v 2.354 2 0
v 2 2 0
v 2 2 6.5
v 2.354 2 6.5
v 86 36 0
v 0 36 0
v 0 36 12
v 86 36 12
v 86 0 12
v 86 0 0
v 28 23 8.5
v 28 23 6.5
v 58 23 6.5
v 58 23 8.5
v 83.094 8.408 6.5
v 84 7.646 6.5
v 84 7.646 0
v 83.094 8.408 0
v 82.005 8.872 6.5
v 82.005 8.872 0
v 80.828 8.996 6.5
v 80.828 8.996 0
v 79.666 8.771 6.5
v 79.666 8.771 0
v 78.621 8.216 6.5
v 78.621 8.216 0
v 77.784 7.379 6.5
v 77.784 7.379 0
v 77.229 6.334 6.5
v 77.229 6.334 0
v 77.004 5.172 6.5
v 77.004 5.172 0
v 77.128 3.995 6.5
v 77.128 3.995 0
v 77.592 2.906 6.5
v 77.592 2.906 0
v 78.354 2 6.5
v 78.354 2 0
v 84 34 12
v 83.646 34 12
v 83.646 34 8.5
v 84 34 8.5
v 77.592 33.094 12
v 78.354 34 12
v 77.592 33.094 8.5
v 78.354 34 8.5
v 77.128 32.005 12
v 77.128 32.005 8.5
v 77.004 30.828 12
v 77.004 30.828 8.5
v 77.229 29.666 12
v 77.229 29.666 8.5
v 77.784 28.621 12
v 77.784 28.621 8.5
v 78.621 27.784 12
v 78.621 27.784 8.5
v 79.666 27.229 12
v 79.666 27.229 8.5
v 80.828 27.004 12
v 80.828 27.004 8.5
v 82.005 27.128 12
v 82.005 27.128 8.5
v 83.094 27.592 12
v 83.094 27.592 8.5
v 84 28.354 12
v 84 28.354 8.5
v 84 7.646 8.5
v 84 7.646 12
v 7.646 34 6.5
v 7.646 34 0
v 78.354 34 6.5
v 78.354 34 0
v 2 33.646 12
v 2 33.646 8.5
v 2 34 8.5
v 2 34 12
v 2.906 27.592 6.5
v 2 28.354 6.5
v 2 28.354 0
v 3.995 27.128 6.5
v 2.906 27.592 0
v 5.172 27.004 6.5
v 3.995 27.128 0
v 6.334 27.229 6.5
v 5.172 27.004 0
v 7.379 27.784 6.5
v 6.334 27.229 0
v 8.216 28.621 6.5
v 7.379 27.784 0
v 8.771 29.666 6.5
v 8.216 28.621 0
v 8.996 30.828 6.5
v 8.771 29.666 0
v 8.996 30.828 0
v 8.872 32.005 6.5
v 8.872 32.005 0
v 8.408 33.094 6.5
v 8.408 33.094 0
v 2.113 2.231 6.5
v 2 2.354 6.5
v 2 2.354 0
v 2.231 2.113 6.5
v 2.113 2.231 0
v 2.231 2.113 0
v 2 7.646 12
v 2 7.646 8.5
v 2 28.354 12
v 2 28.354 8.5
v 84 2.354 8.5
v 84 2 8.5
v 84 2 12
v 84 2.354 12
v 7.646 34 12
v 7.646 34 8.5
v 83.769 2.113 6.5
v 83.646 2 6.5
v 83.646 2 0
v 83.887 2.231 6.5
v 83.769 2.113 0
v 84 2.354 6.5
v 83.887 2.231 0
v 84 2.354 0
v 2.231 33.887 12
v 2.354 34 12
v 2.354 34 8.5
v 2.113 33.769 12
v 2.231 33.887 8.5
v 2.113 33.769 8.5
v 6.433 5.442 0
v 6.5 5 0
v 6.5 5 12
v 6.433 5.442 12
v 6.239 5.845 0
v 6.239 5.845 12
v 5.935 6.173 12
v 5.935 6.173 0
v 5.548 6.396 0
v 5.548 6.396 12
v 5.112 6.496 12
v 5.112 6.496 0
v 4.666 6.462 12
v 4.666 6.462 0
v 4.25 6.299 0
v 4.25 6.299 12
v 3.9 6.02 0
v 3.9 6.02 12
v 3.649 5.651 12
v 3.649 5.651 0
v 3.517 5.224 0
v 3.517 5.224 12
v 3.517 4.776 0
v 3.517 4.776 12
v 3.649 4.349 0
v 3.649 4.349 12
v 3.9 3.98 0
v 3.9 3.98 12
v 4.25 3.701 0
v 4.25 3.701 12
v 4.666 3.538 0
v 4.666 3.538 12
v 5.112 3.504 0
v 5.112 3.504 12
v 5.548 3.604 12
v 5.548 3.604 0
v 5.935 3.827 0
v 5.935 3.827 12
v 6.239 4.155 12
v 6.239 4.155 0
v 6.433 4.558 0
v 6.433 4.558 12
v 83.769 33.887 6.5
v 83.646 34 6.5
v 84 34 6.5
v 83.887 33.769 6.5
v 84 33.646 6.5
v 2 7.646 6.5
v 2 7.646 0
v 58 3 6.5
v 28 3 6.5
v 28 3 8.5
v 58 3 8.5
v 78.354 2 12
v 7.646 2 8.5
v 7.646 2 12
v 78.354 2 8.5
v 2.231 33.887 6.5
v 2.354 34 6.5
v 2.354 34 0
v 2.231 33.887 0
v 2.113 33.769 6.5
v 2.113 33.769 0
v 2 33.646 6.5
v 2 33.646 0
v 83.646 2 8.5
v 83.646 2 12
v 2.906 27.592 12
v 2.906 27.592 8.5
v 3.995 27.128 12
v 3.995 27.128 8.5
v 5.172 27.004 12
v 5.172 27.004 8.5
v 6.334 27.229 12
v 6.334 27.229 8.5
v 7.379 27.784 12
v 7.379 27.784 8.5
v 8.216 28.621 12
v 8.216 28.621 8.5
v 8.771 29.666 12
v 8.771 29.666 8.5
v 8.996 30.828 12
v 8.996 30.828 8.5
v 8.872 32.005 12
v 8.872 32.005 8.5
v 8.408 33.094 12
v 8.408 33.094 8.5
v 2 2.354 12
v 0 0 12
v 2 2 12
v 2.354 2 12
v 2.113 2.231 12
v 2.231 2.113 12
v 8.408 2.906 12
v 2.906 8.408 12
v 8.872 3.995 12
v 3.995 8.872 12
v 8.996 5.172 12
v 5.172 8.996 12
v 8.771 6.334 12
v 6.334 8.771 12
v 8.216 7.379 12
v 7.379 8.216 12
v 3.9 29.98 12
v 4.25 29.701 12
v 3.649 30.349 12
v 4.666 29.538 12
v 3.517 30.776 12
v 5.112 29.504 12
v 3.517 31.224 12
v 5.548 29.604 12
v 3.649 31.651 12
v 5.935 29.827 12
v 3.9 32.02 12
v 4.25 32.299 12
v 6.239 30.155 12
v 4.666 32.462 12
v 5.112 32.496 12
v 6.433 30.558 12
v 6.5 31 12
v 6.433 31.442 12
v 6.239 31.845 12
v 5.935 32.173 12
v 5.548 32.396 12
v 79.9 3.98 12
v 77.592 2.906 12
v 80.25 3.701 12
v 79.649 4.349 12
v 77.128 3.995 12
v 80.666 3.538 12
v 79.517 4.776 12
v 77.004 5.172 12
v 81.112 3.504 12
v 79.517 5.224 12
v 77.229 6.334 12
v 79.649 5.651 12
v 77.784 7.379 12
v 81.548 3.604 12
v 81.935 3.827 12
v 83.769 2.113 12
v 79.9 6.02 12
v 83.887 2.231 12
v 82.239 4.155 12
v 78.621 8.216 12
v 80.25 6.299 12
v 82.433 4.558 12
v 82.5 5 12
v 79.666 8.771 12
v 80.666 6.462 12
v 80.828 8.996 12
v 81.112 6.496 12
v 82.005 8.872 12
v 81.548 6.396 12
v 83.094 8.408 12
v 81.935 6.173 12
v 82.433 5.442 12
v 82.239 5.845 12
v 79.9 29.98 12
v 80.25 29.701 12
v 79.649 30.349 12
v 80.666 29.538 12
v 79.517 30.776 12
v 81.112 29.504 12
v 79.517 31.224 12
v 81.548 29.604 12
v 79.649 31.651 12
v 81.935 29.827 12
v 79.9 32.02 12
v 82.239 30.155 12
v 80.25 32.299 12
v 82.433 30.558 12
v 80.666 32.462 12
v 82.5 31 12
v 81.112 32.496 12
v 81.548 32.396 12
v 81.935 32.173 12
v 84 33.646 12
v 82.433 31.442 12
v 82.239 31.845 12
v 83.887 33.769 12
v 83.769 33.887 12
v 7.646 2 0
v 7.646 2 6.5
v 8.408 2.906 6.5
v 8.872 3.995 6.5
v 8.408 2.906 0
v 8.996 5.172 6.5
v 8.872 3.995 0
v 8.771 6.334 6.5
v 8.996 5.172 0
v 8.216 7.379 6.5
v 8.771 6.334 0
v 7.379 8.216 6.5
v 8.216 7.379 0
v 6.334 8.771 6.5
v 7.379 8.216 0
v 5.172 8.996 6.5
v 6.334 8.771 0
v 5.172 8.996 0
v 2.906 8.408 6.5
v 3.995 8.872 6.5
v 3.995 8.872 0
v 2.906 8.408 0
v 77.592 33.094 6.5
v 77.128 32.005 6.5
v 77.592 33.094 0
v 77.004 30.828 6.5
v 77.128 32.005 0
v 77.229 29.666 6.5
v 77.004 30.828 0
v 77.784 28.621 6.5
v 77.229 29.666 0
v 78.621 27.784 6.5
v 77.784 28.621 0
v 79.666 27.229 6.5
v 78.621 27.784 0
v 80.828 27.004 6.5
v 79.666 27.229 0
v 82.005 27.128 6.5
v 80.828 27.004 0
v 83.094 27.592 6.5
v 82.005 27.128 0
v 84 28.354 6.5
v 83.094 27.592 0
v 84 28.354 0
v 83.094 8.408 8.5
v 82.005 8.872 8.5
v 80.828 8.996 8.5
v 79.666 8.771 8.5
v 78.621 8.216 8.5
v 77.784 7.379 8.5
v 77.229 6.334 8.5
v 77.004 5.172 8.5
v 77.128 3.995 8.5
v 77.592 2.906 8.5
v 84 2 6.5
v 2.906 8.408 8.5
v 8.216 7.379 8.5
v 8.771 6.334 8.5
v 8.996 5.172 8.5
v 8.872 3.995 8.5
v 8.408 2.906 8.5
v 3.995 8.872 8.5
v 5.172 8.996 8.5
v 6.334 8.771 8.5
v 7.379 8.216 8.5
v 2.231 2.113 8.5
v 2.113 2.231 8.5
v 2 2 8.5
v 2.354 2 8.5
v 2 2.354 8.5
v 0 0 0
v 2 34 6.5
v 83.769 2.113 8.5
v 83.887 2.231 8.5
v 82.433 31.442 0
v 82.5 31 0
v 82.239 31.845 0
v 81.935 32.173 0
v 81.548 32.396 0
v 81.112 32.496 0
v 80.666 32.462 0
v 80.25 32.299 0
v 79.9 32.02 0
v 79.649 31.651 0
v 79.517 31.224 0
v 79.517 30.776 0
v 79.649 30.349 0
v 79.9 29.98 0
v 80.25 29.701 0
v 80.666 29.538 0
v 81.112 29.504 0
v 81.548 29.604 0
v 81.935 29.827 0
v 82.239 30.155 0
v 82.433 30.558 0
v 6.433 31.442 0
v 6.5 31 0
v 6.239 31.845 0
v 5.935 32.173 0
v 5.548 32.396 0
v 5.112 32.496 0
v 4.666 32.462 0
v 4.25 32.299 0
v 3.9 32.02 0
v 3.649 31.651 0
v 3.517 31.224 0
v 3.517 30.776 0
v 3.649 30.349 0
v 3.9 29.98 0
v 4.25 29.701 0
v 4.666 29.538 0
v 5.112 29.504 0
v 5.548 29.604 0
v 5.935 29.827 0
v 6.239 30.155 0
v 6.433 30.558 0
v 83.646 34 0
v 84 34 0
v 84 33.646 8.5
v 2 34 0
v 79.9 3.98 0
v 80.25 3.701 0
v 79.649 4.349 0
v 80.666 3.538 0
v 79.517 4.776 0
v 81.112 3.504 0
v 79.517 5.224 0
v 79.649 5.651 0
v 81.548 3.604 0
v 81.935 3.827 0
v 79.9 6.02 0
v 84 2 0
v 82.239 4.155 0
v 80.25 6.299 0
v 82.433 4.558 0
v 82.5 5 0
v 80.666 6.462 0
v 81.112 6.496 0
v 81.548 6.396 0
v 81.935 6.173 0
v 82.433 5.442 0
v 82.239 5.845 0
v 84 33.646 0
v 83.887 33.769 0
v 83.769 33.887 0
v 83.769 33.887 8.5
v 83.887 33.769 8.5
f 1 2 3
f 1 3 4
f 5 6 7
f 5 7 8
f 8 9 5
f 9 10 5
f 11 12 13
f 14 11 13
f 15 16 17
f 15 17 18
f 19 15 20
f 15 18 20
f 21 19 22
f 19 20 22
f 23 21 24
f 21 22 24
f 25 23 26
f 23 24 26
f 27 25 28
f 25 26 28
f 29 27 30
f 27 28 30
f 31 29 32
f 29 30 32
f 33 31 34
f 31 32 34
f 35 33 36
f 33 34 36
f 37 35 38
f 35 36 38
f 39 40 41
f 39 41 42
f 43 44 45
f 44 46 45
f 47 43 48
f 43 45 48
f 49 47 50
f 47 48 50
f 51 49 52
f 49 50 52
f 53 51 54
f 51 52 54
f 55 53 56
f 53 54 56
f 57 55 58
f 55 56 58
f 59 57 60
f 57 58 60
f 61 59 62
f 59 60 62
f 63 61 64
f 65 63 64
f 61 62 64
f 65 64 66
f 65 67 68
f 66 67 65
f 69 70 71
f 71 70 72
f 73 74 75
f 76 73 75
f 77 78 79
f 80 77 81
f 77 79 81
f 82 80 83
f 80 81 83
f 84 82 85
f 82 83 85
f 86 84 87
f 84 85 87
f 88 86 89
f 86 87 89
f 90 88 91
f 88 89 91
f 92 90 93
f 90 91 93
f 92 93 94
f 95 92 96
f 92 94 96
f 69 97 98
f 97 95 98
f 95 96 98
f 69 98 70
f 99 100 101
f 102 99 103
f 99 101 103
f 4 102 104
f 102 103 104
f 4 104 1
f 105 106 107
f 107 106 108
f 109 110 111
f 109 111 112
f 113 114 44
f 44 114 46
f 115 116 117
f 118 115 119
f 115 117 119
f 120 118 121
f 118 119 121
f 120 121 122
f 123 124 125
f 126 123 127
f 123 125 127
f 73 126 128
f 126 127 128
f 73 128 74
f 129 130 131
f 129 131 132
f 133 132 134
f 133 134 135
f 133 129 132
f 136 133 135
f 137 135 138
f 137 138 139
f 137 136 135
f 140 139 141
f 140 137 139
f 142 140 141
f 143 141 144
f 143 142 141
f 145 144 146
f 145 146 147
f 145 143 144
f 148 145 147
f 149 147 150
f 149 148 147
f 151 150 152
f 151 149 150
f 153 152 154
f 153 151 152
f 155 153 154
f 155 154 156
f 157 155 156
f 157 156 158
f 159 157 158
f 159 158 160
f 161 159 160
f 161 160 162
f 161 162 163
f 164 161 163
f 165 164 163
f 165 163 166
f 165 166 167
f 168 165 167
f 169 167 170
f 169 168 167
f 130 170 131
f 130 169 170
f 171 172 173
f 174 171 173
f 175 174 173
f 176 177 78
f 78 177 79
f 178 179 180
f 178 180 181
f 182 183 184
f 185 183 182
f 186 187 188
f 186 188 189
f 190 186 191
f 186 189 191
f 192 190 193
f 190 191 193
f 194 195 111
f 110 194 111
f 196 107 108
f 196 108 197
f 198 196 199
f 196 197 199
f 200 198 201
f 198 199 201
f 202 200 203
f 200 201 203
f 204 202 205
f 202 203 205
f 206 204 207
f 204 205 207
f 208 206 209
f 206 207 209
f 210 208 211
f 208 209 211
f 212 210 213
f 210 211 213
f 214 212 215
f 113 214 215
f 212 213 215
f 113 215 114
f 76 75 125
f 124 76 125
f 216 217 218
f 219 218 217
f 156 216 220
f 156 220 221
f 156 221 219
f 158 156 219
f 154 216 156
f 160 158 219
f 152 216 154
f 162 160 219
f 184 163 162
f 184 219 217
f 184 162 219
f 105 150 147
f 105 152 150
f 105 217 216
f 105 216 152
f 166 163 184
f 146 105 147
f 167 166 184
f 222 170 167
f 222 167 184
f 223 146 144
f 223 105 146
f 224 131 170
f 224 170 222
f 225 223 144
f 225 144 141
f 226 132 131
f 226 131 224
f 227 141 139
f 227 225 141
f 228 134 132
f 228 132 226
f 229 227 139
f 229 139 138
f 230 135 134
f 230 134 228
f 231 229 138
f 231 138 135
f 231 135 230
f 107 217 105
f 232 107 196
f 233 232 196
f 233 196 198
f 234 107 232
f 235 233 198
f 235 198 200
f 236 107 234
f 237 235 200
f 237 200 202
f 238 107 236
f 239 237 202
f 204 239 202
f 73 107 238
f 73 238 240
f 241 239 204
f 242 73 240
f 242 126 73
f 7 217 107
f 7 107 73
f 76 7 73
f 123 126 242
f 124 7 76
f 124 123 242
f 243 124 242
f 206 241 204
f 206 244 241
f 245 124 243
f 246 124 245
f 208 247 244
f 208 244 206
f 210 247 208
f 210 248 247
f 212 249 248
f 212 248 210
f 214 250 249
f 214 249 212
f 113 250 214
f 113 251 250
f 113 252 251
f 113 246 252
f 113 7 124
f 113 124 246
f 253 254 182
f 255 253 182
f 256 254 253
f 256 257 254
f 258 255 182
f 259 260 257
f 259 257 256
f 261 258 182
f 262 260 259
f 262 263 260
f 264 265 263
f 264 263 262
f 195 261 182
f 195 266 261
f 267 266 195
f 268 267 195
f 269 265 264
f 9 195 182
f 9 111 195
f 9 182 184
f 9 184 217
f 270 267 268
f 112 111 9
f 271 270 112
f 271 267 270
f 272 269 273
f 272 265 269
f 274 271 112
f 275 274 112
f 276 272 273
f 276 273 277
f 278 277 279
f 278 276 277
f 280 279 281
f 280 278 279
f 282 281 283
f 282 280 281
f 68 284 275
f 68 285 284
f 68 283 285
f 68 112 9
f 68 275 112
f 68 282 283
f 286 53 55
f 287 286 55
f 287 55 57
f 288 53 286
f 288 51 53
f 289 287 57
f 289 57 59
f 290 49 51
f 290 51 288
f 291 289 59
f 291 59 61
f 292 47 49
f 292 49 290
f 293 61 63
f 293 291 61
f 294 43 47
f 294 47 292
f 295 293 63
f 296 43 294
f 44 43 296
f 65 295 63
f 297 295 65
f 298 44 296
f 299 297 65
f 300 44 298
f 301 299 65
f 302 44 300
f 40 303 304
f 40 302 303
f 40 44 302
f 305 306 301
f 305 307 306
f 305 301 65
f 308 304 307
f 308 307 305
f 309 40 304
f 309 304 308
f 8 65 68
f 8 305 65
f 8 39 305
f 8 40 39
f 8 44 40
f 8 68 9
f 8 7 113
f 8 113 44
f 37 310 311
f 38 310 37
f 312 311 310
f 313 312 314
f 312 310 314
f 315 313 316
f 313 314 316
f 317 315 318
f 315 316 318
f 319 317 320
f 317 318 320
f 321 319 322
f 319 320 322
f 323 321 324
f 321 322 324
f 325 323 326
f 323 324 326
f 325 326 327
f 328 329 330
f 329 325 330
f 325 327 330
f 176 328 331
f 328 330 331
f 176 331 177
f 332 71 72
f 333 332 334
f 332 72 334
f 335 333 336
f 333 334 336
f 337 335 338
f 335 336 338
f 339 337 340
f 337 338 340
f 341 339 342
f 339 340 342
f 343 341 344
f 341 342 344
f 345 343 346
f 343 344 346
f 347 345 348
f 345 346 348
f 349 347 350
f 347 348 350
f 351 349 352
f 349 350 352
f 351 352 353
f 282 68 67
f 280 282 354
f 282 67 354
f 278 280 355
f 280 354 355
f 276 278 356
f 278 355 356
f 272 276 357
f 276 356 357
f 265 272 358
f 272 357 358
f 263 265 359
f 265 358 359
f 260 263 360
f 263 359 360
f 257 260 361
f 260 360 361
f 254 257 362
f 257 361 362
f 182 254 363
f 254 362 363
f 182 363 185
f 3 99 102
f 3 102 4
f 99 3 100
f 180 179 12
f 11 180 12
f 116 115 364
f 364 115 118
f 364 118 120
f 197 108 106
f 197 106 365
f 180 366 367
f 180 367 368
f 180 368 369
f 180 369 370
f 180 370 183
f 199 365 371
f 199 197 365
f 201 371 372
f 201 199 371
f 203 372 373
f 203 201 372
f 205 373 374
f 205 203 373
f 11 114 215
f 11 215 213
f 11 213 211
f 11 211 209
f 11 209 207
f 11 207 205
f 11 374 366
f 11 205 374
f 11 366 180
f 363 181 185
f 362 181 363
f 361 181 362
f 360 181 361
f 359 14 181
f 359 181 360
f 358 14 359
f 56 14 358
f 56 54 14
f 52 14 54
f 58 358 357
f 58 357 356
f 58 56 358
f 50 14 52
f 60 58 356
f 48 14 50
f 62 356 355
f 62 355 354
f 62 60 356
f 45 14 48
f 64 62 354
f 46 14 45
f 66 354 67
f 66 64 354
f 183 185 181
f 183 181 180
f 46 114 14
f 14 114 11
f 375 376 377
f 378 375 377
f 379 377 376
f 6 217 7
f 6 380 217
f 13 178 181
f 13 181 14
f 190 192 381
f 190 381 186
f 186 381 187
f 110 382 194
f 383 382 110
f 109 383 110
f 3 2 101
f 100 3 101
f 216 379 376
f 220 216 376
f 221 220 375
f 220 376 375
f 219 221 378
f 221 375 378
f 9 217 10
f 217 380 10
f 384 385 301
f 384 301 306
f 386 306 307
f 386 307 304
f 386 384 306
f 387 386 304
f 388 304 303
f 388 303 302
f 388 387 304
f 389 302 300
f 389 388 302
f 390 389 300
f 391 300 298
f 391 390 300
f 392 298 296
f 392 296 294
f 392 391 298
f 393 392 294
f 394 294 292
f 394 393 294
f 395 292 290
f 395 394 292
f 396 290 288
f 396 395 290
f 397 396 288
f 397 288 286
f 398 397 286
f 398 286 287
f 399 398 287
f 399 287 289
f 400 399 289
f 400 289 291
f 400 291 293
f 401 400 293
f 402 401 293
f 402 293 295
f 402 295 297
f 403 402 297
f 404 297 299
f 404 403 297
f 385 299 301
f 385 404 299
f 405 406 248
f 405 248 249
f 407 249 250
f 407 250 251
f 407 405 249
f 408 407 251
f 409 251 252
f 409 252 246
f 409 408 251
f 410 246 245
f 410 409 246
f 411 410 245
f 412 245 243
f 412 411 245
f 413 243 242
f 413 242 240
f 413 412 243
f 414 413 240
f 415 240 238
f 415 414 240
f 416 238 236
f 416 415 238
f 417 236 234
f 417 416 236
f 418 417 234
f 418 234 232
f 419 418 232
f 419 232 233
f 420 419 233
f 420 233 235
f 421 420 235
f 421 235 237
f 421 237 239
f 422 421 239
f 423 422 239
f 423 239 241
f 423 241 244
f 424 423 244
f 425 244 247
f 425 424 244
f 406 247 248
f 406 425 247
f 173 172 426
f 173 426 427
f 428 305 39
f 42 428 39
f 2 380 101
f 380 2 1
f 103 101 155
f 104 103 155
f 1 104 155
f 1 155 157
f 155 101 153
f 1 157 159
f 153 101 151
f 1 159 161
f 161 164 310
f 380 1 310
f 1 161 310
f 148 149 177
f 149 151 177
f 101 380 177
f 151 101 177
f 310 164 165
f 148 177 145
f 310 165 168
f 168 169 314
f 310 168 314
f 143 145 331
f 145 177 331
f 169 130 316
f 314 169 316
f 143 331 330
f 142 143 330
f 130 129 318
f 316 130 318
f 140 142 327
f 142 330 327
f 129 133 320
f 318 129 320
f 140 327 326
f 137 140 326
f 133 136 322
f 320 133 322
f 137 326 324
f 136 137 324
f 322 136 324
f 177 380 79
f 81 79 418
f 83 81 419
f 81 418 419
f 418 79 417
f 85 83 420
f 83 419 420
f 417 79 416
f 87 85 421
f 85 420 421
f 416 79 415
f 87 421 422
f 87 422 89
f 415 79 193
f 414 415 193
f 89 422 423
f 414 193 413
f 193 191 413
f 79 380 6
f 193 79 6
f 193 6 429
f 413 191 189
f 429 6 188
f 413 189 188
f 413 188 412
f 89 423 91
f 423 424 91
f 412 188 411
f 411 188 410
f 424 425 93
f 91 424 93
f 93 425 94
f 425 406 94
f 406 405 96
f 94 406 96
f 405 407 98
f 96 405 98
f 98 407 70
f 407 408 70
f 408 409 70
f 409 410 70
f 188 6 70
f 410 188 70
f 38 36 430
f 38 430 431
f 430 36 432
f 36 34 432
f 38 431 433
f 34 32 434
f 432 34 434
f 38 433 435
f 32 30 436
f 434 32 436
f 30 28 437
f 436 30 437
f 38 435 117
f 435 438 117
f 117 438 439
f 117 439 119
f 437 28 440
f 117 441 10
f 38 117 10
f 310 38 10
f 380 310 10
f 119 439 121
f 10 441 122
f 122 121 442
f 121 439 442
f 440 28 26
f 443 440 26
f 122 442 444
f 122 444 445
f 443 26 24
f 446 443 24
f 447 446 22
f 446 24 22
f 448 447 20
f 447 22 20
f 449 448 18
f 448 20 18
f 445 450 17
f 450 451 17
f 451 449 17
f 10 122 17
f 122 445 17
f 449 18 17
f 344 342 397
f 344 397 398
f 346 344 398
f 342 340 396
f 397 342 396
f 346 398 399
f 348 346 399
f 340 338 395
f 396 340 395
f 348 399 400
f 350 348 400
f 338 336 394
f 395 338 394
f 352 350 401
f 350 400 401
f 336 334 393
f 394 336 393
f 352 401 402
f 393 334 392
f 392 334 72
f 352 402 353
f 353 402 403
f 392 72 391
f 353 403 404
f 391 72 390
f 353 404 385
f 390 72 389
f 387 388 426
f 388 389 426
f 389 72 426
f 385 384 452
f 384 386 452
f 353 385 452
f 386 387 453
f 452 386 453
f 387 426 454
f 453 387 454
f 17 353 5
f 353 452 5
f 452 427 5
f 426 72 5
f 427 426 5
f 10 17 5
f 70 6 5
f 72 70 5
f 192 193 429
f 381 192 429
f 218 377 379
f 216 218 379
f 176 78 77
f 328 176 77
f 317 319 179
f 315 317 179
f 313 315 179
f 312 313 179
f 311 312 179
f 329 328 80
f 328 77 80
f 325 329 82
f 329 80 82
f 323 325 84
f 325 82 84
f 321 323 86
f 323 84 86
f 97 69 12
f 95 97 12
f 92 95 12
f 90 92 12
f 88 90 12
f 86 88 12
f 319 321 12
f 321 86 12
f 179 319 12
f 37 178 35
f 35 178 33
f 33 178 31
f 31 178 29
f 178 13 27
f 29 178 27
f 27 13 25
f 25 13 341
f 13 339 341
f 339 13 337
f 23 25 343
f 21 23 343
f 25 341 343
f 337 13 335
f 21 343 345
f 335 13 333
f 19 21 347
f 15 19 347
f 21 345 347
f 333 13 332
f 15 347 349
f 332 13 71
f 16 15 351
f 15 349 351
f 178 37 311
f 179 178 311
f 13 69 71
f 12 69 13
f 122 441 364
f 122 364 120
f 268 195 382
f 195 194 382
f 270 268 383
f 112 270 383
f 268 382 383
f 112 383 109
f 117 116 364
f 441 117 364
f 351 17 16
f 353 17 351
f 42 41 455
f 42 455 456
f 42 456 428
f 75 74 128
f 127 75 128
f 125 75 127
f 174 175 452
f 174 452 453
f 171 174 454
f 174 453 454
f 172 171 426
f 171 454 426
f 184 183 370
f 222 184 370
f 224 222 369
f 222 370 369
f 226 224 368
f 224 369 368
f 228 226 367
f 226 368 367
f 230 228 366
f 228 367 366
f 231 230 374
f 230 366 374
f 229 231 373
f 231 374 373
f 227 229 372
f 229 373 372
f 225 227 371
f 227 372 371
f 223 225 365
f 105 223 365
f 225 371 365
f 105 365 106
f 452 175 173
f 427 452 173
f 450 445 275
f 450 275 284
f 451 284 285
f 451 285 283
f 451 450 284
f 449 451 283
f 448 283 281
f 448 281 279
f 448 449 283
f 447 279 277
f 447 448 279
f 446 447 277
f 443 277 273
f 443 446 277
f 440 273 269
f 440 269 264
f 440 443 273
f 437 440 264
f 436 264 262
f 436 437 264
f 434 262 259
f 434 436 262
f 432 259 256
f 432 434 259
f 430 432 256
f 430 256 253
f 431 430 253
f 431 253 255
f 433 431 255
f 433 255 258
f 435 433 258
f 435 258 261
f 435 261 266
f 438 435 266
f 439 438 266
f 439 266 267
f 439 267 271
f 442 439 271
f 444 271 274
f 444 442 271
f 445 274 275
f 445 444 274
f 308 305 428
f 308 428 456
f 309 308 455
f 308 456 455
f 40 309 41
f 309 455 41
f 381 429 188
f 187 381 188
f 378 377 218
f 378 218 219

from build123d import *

# Parameters (mm, degrees)
CYLINDER054_R       = 1.5
CYLINDER054_DEPTH   = 12
ARRAY001025_X_COUNT = 2
ARRAY001025_X_PITCH = 76
ARRAY001025_Y_COUNT = 2
ARRAY001025_Y_PITCH = 26
BOX026_W            = 82
BOX026_H            = 32
BOX026_DEPTH        = 12
BOX025_W            = 86
BOX025_H            = 36
BOX025_DEPTH        = 12
BOX028_W            = 30
BOX028_H            = 20
BOX028_DEPTH        = 10
BOX027_W            = 86
BOX027_H            = 36
BOX027_DEPTH        = 2
CYLINDER053_R       = 4
CYLINDER053_DEPTH   = 12
ARRAY001024_X_COUNT = 2
ARRAY001024_X_PITCH = 76
ARRAY001024_Y_COUNT = 2
ARRAY001024_Y_PITCH = 26


with BuildPart() as msub_bolt_hole_array:
    # Cylinder054 → Cylinder054 (new body)
    with BuildSketch(Plane(origin=(5, 5, 0), x_dir=(1, 0, 0), z_dir=(0, 0, 1))):
        Circle(CYLINDER054_R)
    extrude(amount=CYLINDER054_DEPTH)

    # Array001025 X: msub bolt hole array ×2


with BuildPart() as msub_bolt_hole_array_1:
    add(msub_bolt_hole_array.part)
    with Locations(*[(i * ARRAY001025_X_PITCH, 0, 0) for i in range(1, ARRAY001025_X_COUNT)]):
        add(msub_bolt_hole_array.part)

    # Array001025 Y: msub bolt hole array ×2


with BuildPart() as msub_bolt_hole_array_2:
    add(msub_bolt_hole_array_1.part)
    with Locations(*[(0, i * ARRAY001025_Y_PITCH, 0) for i in range(1, ARRAY001025_Y_COUNT)]):
        add(msub_bolt_hole_array_1.part)


with BuildPart() as extraction_cube:
    # Box026 → Box026 (new body)
    with BuildSketch(Plane(origin=(2, 2, 0), x_dir=(1, 0, 0), z_dir=(0, 0, 1))):
        with Locations((41, 16)):
            Rectangle(BOX026_W, BOX026_H)
    extrude(amount=BOX026_DEPTH)


with BuildPart() as msub_box_cut:
    # Box025 → Box025 (new body)
    with BuildSketch(Plane.XY):
        with Locations((43, 18)):
            Rectangle(BOX025_W, BOX025_H)
    extrude(amount=BOX025_DEPTH)

    # Cut022: cut extraction cube
    add(extraction_cube.part, mode=Mode.SUBTRACT)


with BuildPart() as msub_top_hole001:
    # Box028 → Box028 (new body)
    with BuildSketch(Plane(origin=(28, 3, -5), x_dir=(1, 0, 0), z_dir=(0, 0, 1))):
        with Locations((15, 10)):
            Rectangle(BOX028_W, BOX028_H)
    extrude(amount=BOX028_DEPTH)


with BuildPart() as msub_top_cut_copy:
    # Box027 → Box027 (new body)
    with BuildSketch(Plane.XY):
        with Locations((43, 18)):
            Rectangle(BOX027_W, BOX027_H)
    extrude(amount=BOX027_DEPTH)

    # Cut023002: cut msub top hole001
    add(msub_top_hole001.part, mode=Mode.SUBTRACT)


with BuildPart() as msub_top_cut_copy_1:
    # Cut023002 placement: moved
    add(msub_top_cut_copy.part.moved(Location((0, 0, 6.5))))


with BuildPart() as msub_middle_cut:
    # Cylinder053 → Cylinder053 (new body)
    with BuildSketch(Plane(origin=(5, 5, 0), x_dir=(1, 0, 0), z_dir=(0, 0, 1))):
        Circle(CYLINDER053_R)
    extrude(amount=CYLINDER053_DEPTH)

    # Array001024 X: msub middle cut ×2


with BuildPart() as msub_middle_cut_1:
    add(msub_middle_cut.part)
    with Locations(*[(i * ARRAY001024_X_PITCH, 0, 0) for i in range(1, ARRAY001024_X_COUNT)]):
        add(msub_middle_cut.part)

    # Array001024 Y: msub middle cut ×2


with BuildPart() as msub_middle_cut_2:
    add(msub_middle_cut_1.part)
    with Locations(*[(0, i * ARRAY001024_Y_PITCH, 0) for i in range(1, ARRAY001024_Y_COUNT)]):
        add(msub_middle_cut_1.part)

    # Fusion035: union msub box cut, msub top cut copy
    add(msub_box_cut.part)
    add(msub_top_cut_copy_1.part)

    # Cut023: cut msub bolt hole array
    add(msub_bolt_hole_array_2.part, mode=Mode.SUBTRACT)


solid = msub_middle_cut_2.part
